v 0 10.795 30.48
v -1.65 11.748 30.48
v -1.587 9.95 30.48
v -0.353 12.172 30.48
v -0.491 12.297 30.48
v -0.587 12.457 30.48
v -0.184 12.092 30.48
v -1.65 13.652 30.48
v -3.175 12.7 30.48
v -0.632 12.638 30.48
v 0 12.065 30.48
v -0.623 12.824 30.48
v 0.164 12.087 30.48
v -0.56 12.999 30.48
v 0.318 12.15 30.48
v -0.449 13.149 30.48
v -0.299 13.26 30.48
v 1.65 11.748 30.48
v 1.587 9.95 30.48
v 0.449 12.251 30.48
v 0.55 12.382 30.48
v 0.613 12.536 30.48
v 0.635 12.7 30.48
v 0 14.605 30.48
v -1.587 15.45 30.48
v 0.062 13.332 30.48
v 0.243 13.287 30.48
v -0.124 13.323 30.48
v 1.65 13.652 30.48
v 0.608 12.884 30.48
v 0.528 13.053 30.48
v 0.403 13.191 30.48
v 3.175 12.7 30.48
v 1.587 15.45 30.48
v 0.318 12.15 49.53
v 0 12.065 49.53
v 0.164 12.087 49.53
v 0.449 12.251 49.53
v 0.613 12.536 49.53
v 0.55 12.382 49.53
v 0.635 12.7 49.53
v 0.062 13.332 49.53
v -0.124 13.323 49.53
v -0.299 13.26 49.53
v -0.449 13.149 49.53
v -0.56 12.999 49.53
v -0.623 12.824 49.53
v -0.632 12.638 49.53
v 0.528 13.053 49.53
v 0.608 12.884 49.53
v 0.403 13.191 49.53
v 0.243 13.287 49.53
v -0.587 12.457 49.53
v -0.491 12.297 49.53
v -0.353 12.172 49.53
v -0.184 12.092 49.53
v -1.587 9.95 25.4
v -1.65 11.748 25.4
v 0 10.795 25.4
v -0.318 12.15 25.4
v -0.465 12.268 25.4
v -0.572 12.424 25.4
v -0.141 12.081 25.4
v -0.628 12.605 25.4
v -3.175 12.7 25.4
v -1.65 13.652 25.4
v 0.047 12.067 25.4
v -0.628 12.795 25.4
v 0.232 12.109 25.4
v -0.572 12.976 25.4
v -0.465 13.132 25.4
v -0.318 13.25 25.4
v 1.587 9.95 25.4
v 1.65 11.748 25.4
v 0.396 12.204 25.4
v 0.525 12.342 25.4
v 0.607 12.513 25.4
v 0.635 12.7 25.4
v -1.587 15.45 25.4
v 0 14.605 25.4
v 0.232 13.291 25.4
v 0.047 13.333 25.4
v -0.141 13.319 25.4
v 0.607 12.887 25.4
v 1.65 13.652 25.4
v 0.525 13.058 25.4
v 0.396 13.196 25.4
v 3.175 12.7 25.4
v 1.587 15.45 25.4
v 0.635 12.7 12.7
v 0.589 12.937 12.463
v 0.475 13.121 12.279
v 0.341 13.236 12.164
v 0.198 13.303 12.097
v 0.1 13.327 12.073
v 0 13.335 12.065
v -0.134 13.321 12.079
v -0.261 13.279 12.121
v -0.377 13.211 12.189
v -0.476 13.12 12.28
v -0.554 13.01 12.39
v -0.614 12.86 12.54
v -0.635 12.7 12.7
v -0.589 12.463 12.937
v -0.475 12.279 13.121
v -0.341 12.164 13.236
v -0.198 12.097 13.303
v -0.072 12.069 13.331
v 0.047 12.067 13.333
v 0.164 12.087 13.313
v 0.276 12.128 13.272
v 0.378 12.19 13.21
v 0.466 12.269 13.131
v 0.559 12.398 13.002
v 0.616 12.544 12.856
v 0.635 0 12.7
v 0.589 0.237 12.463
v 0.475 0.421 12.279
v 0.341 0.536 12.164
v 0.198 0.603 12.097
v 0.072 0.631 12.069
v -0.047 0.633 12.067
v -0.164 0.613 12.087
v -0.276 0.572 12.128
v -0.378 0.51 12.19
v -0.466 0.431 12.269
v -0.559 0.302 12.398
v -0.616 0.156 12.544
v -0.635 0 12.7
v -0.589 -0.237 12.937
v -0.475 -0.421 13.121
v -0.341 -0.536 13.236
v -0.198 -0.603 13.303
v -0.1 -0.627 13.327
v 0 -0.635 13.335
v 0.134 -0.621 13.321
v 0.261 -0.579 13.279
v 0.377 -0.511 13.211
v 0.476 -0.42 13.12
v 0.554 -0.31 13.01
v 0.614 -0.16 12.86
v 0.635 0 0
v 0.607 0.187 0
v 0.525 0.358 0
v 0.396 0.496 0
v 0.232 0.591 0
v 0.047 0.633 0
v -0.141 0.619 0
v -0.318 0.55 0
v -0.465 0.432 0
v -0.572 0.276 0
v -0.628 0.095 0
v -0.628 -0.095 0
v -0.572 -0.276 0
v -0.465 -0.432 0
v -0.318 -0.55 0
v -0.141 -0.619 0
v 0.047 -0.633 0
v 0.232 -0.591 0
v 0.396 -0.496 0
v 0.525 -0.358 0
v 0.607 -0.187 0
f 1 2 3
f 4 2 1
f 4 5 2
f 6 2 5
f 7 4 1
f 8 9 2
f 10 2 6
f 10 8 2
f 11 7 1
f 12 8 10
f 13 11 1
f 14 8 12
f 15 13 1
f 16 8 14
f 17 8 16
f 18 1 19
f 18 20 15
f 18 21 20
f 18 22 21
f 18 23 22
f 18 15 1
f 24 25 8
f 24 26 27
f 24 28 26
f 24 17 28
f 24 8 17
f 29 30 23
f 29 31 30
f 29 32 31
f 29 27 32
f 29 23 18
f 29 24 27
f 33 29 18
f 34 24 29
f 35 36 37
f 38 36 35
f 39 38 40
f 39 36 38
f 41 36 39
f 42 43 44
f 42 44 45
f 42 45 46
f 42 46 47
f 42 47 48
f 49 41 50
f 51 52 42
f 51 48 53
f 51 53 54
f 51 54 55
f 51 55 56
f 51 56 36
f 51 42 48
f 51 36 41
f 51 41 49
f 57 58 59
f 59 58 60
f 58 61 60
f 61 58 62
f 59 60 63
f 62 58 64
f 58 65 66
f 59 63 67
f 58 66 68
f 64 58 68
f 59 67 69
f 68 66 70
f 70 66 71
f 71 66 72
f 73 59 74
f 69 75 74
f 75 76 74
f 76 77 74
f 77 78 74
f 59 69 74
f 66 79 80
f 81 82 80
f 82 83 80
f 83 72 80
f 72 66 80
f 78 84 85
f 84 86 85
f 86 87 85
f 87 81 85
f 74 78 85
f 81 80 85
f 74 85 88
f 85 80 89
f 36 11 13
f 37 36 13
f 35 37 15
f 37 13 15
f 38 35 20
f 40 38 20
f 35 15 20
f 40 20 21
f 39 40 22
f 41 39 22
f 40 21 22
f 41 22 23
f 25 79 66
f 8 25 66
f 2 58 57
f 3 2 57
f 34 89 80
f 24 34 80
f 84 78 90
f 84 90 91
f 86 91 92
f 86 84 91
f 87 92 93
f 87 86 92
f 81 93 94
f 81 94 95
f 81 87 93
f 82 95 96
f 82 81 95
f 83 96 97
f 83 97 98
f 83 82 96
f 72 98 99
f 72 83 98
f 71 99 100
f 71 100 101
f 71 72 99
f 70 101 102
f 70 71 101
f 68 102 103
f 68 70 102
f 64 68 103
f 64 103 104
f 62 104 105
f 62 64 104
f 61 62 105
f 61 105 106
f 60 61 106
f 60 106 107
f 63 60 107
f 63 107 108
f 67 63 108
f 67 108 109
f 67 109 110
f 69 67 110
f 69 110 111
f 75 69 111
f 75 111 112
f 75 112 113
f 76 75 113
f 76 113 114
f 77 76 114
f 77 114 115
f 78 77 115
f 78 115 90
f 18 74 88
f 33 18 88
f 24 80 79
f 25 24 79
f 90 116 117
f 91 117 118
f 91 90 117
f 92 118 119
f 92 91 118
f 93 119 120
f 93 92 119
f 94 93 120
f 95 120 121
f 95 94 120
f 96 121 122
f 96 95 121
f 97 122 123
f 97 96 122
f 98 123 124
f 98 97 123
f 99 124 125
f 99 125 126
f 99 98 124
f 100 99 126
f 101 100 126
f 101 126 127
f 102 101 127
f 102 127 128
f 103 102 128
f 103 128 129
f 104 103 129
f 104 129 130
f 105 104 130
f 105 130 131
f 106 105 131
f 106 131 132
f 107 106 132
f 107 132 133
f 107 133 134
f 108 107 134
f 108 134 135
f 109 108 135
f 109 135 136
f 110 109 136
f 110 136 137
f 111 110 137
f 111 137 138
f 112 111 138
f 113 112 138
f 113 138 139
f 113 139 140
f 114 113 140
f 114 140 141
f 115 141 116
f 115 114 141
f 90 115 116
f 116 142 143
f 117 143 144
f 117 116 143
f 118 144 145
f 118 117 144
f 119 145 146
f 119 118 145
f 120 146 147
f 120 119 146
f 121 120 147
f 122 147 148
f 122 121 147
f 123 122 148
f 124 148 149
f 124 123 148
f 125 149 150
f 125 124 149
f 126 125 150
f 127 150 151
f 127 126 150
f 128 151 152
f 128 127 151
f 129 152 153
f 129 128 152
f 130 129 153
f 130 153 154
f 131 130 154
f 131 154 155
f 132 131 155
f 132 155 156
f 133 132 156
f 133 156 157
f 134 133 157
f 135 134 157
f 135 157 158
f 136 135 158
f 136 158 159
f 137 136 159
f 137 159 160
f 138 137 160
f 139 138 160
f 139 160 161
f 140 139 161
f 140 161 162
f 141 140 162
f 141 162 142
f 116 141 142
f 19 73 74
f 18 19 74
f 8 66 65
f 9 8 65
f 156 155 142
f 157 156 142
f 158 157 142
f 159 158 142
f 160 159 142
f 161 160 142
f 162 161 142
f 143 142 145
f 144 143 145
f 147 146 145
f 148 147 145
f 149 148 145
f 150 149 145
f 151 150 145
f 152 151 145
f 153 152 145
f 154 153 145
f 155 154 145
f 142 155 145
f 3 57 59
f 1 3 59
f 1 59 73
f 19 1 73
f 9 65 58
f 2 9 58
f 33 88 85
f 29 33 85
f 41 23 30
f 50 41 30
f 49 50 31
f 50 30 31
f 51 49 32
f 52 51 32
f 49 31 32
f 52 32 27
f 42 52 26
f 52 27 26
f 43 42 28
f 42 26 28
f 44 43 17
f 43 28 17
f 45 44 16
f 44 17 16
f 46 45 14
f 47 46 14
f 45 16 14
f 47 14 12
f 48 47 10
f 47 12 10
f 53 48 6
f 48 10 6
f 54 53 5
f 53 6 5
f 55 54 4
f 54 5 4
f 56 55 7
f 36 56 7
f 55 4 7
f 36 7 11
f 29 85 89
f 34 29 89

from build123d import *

# Parameters (mm, degrees)
F0_R     = 0.635
F4_DEPTH = 5.08
F6_DEPTH = 19.05


with BuildPart() as f2:
    # F2: sweep along a path in F1
    with BuildLine(Plane.YZ) as f2_path:
        Line((0, 0), (0, 12.7))
        Line((0, 12.7), (12.7, 12.7))
        Line((12.7, 12.7), (12.7, 25.4))
    # F0 (on Top) → F2 (sweep)
    with BuildSketch(Plane.XY):
        Circle(F0_R)
    sweep(path=f2_path.line, transition=Transition.RIGHT)

    # F3 (on face) → F4 (join)
    with BuildSketch(Plane.XY.offset(25.4)):
        with BuildLine():
            ThreePointArc((-0.9525, 14.3497783942), (-1.3470384182, 14.0470384182), (-1.6497783942, 13.6525))
            Line((-1.6497783942, 13.6525), (-0.5499261314, 13.0175))
            ThreePointArc((-0.5499261314, 13.0175), (-0.4490128061, 13.1490128061), (-0.3175, 13.2499261314))
            Line((-0.3175, 13.2499261314), (-0.9525, 14.3497783942))
        make_face()
        with BuildLine():
            ThreePointArc((-0.3175, 13.2499261314), (-0.1643500936, 13.3133628997), (0, 13.335))
            Line((0, 13.335), (0, 14.605))
            ThreePointArc((0, 14.605), (-0.4930502809, 14.5400886991), (-0.9525, 14.3497783942))
            Line((-0.9525, 14.3497783942), (-0.3175, 13.2499261314))
        make_face()
        with BuildLine():
            Line((0, 14.605), (-1.5875, 15.449630657))
            Line((-1.5875, 15.449630657), (-0.9525, 14.3497783942))
            ThreePointArc((-0.9525, 14.3497783942), (-0.4930502809, 14.5400886991), (0, 14.605))
        make_face()
        with BuildLine():
            Line((-0.9525, 14.3497783942), (-1.5875, 15.449630657))
            Line((-1.5875, 15.449630657), (-1.6497783942, 13.6525))
            ThreePointArc((-1.6497783942, 13.6525), (-1.3470384182, 14.0470384182), (-0.9525, 14.3497783942))
        make_face()
        with BuildLine():
            Line((-0.3175, 13.2499261314), (0, 12.7))
            Line((0, 12.7), (0, 13.335))
            ThreePointArc((0, 13.335), (-0.1643500936, 13.3133628997), (-0.3175, 13.2499261314))
        make_face()
        with BuildLine():
            Line((-0.5499261314, 12.3825), (0, 12.7))
            Line((0, 12.7), (-0.635, 12.7))
            ThreePointArc((-0.635, 12.7), (-0.6133628997, 12.5356499064), (-0.5499261314, 12.3825))
        make_face()
        with BuildLine():
            Line((-0.635, 12.7), (0, 12.7))
            Line((0, 12.7), (-0.5499261314, 13.0175))
            ThreePointArc((-0.5499261314, 13.0175), (-0.6133628997, 12.8643500936), (-0.635, 12.7))
        make_face()
        with BuildLine():
            Line((-0.5499261314, 13.0175), (0, 12.7))
            Line((0, 12.7), (-0.3175, 13.2499261314))
            ThreePointArc((-0.3175, 13.2499261314), (-0.4490128061, 13.1490128061), (-0.5499261314, 13.0175))
        make_face()
        with BuildLine():
            Line((-0.3175, 12.1500738686), (0, 12.7))
            Line((0, 12.7), (-0.5499261314, 12.3825))
            ThreePointArc((-0.5499261314, 12.3825), (-0.4490128061, 12.2509871939), (-0.3175, 12.1500738686))
        make_face()
        with BuildLine():
            Line((0, 12.7), (0, 12.065))
            ThreePointArc((0, 12.065), (0.1643500936, 12.0866371003), (0.3175, 12.1500738686))
            Line((0.3175, 12.1500738686), (0, 12.7))
        make_face()
        with BuildLine():
            Line((0.5499261314, 12.3825), (0, 12.7))
            Line((0, 12.7), (0.3175, 12.1500738686))
            ThreePointArc((0.3175, 12.1500738686), (0.4490128061, 12.2509871939), (0.5499261314, 12.3825))
        make_face()
        with BuildLine():
            Line((0.635, 12.7), (0, 12.7))
            Line((0, 12.7), (0.5499261314, 12.3825))
            ThreePointArc((0.5499261314, 12.3825), (0.6133628997, 12.5356499064), (0.635, 12.7))
        make_face()
        with BuildLine():
            Line((0.5499261314, 13.0175), (0, 12.7))
            Line((0, 12.7), (0.635, 12.7))
            ThreePointArc((0.635, 12.7), (0.6133628997, 12.8643500936), (0.5499261314, 13.0175))
        make_face()
        with BuildLine():
            Line((0.3175, 13.2499261314), (0, 12.7))
            Line((0, 12.7), (0.5499261314, 13.0175))
            ThreePointArc((0.5499261314, 13.0175), (0.4490128061, 13.1490128061), (0.3175, 13.2499261314))
        make_face()
        with BuildLine():
            Line((0, 13.335), (0, 12.7))
            Line((0, 12.7), (0.3175, 13.2499261314))
            ThreePointArc((0.3175, 13.2499261314), (0.1643500936, 13.3133628997), (0, 13.335))
        make_face()
        with BuildLine():
            ThreePointArc((-0.3175, 12.1500738686), (-0.1643500936, 12.0866371003), (0, 12.065))
            Line((0, 12.065), (0, 12.7))
            Line((0, 12.7), (-0.3175, 12.1500738686))
        make_face()
        with BuildLine():
            ThreePointArc((0, 13.335), (0.1643500936, 13.3133628997), (0.3175, 13.2499261314))
            Line((0.3175, 13.2499261314), (0.9525, 14.3497783942))
            ThreePointArc((0.9525, 14.3497783942), (0.4930502809, 14.5400886991), (0, 14.605))
            Line((0, 14.605), (0, 13.335))
        make_face()
        with BuildLine():
            Line((0.5499261314, 13.0175), (1.6497783942, 13.6525))
            ThreePointArc((1.6497783942, 13.6525), (1.3470384182, 14.0470384182), (0.9525, 14.3497783942))
            Line((0.9525, 14.3497783942), (0.3175, 13.2499261314))
            ThreePointArc((0.3175, 13.2499261314), (0.4490128061, 13.1490128061), (0.5499261314, 13.0175))
        make_face()
        with BuildLine():
            Line((0.9525, 14.3497783942), (1.5875, 15.449630657))
            Line((1.5875, 15.449630657), (0, 14.605))
            ThreePointArc((0, 14.605), (0.4930502809, 14.5400886991), (0.9525, 14.3497783942))
        make_face()
        with BuildLine():
            Line((1.6497783942, 13.6525), (1.5875, 15.449630657))
            Line((1.5875, 15.449630657), (0.9525, 14.3497783942))
            ThreePointArc((0.9525, 14.3497783942), (1.3470384182, 14.0470384182), (1.6497783942, 13.6525))
        make_face()
        with BuildLine():
            Line((0.635, 12.7), (1.905, 12.7))
            ThreePointArc((1.905, 12.7), (1.8400886991, 13.1930502809), (1.6497783942, 13.6525))
            Line((1.6497783942, 13.6525), (0.5499261314, 13.0175))
            ThreePointArc((0.5499261314, 13.0175), (0.6133628997, 12.8643500936), (0.635, 12.7))
        make_face()
        with BuildLine():
            Line((0.5499261314, 12.3825), (1.6497783942, 11.7475))
            ThreePointArc((1.6497783942, 11.7475), (1.8400886991, 12.2069497191), (1.905, 12.7))
            Line((1.905, 12.7), (0.635, 12.7))
            ThreePointArc((0.635, 12.7), (0.6133628997, 12.5356499064), (0.5499261314, 12.3825))
        make_face()
        with BuildLine():
            Line((0.3175, 12.1500738686), (0.9525, 11.0502216058))
            ThreePointArc((0.9525, 11.0502216058), (1.3470384182, 11.3529615818), (1.6497783942, 11.7475))
            Line((1.6497783942, 11.7475), (0.5499261314, 12.3825))
            ThreePointArc((0.5499261314, 12.3825), (0.4490128061, 12.2509871939), (0.3175, 12.1500738686))
        make_face()
        with BuildLine():
            Line((0, 12.065), (0, 10.795))
            ThreePointArc((0, 10.795), (0.4930502809, 10.8599113009), (0.9525, 11.0502216058))
            Line((0.9525, 11.0502216058), (0.3175, 12.1500738686))
            ThreePointArc((0.3175, 12.1500738686), (0.1643500936, 12.0866371003), (0, 12.065))
        make_face()
        with BuildLine():
            ThreePointArc((-0.9525, 11.0502216058), (-0.4930502809, 10.8599113009), (0, 10.795))
            Line((0, 10.795), (0, 12.065))
            ThreePointArc((0, 12.065), (-0.1643500936, 12.0866371003), (-0.3175, 12.1500738686))
            Line((-0.3175, 12.1500738686), (-0.9525, 11.0502216058))
        make_face()
        with BuildLine():
            ThreePointArc((-1.6497783942, 11.7475), (-1.3470384182, 11.3529615818), (-0.9525, 11.0502216058))
            Line((-0.9525, 11.0502216058), (-0.3175, 12.1500738686))
            ThreePointArc((-0.3175, 12.1500738686), (-0.4490128061, 12.2509871939), (-0.5499261314, 12.3825))
            Line((-0.5499261314, 12.3825), (-1.6497783942, 11.7475))
        make_face()
        with BuildLine():
            ThreePointArc((-1.905, 12.7), (-1.8400886991, 12.2069497191), (-1.6497783942, 11.7475))
            Line((-1.6497783942, 11.7475), (-0.5499261314, 12.3825))
            ThreePointArc((-0.5499261314, 12.3825), (-0.6133628997, 12.5356499064), (-0.635, 12.7))
            Line((-0.635, 12.7), (-1.905, 12.7))
        make_face()
        with BuildLine():
            ThreePointArc((-1.6497783942, 13.6525), (-1.8400886991, 13.1930502809), (-1.905, 12.7))
            Line((-1.905, 12.7), (-0.635, 12.7))
            ThreePointArc((-0.635, 12.7), (-0.6133628997, 12.8643500936), (-0.5499261314, 13.0175))
            Line((-0.5499261314, 13.0175), (-1.6497783942, 13.6525))
        make_face()
        with BuildLine():
            Line((-1.6497783942, 13.6525), (-3.175, 12.7))
            Line((-3.175, 12.7), (-1.905, 12.7))
            ThreePointArc((-1.905, 12.7), (-1.8400886991, 13.1930502809), (-1.6497783942, 13.6525))
        make_face()
        with BuildLine():
            Line((-1.905, 12.7), (-3.175, 12.7))
            Line((-3.175, 12.7), (-1.6497783942, 11.7475))
            ThreePointArc((-1.6497783942, 11.7475), (-1.8400886991, 12.2069497191), (-1.905, 12.7))
        make_face()
        with BuildLine():
            Line((-1.6497783942, 11.7475), (-1.5875, 9.950369343))
            Line((-1.5875, 9.950369343), (-0.9525, 11.0502216058))
            ThreePointArc((-0.9525, 11.0502216058), (-1.3470384182, 11.3529615818), (-1.6497783942, 11.7475))
        make_face()
        with BuildLine():
            Line((-1.5875, 9.950369343), (0, 10.795))
            ThreePointArc((0, 10.795), (-0.4930502809, 10.8599113009), (-0.9525, 11.0502216058))
            Line((-0.9525, 11.0502216058), (-1.5875, 9.950369343))
        make_face()
        with BuildLine():
            ThreePointArc((0.9525, 11.0502216058), (0.4930502809, 10.8599113009), (0, 10.795))
            Line((0, 10.795), (1.5875, 9.950369343))
            Line((1.5875, 9.950369343), (0.9525, 11.0502216058))
        make_face()
        with BuildLine():
            Line((0.9525, 11.0502216058), (1.5875, 9.950369343))
            Line((1.5875, 9.950369343), (1.6497783942, 11.7475))
            ThreePointArc((1.6497783942, 11.7475), (1.3470384182, 11.3529615818), (0.9525, 11.0502216058))
        make_face()
        with BuildLine():
            Line((1.6497783942, 11.7475), (3.175, 12.7))
            Line((3.175, 12.7), (1.905, 12.7))
            ThreePointArc((1.905, 12.7), (1.8400886991, 12.2069497191), (1.6497783942, 11.7475))
        make_face()
        with BuildLine():
            Line((1.905, 12.7), (3.175, 12.7))
            Line((3.175, 12.7), (1.6497783942, 13.6525))
            ThreePointArc((1.6497783942, 13.6525), (1.8400886991, 13.1930502809), (1.905, 12.7))
        make_face()
    extrude(amount=F4_DEPTH)

    # F5 (on face) → F6 (join)
    with BuildSketch(Plane.XY.offset(30.48)):
        with BuildLine():
            ThreePointArc((0.635, 12.7), (-0.4490128061, 13.1490128061), (0, 12.065))
            Line((0, 12.065), (0, 12.7))
            Line((0, 12.7), (0.635, 12.7))
        make_face()
        with BuildLine():
            Line((0, 12.7), (0, 12.065))
            ThreePointArc((0, 12.065), (0.4490128061, 12.2509871939), (0.635, 12.7))
            Line((0.635, 12.7), (0, 12.7))
        make_face()
    extrude(amount=F6_DEPTH)


solid = f2.part
